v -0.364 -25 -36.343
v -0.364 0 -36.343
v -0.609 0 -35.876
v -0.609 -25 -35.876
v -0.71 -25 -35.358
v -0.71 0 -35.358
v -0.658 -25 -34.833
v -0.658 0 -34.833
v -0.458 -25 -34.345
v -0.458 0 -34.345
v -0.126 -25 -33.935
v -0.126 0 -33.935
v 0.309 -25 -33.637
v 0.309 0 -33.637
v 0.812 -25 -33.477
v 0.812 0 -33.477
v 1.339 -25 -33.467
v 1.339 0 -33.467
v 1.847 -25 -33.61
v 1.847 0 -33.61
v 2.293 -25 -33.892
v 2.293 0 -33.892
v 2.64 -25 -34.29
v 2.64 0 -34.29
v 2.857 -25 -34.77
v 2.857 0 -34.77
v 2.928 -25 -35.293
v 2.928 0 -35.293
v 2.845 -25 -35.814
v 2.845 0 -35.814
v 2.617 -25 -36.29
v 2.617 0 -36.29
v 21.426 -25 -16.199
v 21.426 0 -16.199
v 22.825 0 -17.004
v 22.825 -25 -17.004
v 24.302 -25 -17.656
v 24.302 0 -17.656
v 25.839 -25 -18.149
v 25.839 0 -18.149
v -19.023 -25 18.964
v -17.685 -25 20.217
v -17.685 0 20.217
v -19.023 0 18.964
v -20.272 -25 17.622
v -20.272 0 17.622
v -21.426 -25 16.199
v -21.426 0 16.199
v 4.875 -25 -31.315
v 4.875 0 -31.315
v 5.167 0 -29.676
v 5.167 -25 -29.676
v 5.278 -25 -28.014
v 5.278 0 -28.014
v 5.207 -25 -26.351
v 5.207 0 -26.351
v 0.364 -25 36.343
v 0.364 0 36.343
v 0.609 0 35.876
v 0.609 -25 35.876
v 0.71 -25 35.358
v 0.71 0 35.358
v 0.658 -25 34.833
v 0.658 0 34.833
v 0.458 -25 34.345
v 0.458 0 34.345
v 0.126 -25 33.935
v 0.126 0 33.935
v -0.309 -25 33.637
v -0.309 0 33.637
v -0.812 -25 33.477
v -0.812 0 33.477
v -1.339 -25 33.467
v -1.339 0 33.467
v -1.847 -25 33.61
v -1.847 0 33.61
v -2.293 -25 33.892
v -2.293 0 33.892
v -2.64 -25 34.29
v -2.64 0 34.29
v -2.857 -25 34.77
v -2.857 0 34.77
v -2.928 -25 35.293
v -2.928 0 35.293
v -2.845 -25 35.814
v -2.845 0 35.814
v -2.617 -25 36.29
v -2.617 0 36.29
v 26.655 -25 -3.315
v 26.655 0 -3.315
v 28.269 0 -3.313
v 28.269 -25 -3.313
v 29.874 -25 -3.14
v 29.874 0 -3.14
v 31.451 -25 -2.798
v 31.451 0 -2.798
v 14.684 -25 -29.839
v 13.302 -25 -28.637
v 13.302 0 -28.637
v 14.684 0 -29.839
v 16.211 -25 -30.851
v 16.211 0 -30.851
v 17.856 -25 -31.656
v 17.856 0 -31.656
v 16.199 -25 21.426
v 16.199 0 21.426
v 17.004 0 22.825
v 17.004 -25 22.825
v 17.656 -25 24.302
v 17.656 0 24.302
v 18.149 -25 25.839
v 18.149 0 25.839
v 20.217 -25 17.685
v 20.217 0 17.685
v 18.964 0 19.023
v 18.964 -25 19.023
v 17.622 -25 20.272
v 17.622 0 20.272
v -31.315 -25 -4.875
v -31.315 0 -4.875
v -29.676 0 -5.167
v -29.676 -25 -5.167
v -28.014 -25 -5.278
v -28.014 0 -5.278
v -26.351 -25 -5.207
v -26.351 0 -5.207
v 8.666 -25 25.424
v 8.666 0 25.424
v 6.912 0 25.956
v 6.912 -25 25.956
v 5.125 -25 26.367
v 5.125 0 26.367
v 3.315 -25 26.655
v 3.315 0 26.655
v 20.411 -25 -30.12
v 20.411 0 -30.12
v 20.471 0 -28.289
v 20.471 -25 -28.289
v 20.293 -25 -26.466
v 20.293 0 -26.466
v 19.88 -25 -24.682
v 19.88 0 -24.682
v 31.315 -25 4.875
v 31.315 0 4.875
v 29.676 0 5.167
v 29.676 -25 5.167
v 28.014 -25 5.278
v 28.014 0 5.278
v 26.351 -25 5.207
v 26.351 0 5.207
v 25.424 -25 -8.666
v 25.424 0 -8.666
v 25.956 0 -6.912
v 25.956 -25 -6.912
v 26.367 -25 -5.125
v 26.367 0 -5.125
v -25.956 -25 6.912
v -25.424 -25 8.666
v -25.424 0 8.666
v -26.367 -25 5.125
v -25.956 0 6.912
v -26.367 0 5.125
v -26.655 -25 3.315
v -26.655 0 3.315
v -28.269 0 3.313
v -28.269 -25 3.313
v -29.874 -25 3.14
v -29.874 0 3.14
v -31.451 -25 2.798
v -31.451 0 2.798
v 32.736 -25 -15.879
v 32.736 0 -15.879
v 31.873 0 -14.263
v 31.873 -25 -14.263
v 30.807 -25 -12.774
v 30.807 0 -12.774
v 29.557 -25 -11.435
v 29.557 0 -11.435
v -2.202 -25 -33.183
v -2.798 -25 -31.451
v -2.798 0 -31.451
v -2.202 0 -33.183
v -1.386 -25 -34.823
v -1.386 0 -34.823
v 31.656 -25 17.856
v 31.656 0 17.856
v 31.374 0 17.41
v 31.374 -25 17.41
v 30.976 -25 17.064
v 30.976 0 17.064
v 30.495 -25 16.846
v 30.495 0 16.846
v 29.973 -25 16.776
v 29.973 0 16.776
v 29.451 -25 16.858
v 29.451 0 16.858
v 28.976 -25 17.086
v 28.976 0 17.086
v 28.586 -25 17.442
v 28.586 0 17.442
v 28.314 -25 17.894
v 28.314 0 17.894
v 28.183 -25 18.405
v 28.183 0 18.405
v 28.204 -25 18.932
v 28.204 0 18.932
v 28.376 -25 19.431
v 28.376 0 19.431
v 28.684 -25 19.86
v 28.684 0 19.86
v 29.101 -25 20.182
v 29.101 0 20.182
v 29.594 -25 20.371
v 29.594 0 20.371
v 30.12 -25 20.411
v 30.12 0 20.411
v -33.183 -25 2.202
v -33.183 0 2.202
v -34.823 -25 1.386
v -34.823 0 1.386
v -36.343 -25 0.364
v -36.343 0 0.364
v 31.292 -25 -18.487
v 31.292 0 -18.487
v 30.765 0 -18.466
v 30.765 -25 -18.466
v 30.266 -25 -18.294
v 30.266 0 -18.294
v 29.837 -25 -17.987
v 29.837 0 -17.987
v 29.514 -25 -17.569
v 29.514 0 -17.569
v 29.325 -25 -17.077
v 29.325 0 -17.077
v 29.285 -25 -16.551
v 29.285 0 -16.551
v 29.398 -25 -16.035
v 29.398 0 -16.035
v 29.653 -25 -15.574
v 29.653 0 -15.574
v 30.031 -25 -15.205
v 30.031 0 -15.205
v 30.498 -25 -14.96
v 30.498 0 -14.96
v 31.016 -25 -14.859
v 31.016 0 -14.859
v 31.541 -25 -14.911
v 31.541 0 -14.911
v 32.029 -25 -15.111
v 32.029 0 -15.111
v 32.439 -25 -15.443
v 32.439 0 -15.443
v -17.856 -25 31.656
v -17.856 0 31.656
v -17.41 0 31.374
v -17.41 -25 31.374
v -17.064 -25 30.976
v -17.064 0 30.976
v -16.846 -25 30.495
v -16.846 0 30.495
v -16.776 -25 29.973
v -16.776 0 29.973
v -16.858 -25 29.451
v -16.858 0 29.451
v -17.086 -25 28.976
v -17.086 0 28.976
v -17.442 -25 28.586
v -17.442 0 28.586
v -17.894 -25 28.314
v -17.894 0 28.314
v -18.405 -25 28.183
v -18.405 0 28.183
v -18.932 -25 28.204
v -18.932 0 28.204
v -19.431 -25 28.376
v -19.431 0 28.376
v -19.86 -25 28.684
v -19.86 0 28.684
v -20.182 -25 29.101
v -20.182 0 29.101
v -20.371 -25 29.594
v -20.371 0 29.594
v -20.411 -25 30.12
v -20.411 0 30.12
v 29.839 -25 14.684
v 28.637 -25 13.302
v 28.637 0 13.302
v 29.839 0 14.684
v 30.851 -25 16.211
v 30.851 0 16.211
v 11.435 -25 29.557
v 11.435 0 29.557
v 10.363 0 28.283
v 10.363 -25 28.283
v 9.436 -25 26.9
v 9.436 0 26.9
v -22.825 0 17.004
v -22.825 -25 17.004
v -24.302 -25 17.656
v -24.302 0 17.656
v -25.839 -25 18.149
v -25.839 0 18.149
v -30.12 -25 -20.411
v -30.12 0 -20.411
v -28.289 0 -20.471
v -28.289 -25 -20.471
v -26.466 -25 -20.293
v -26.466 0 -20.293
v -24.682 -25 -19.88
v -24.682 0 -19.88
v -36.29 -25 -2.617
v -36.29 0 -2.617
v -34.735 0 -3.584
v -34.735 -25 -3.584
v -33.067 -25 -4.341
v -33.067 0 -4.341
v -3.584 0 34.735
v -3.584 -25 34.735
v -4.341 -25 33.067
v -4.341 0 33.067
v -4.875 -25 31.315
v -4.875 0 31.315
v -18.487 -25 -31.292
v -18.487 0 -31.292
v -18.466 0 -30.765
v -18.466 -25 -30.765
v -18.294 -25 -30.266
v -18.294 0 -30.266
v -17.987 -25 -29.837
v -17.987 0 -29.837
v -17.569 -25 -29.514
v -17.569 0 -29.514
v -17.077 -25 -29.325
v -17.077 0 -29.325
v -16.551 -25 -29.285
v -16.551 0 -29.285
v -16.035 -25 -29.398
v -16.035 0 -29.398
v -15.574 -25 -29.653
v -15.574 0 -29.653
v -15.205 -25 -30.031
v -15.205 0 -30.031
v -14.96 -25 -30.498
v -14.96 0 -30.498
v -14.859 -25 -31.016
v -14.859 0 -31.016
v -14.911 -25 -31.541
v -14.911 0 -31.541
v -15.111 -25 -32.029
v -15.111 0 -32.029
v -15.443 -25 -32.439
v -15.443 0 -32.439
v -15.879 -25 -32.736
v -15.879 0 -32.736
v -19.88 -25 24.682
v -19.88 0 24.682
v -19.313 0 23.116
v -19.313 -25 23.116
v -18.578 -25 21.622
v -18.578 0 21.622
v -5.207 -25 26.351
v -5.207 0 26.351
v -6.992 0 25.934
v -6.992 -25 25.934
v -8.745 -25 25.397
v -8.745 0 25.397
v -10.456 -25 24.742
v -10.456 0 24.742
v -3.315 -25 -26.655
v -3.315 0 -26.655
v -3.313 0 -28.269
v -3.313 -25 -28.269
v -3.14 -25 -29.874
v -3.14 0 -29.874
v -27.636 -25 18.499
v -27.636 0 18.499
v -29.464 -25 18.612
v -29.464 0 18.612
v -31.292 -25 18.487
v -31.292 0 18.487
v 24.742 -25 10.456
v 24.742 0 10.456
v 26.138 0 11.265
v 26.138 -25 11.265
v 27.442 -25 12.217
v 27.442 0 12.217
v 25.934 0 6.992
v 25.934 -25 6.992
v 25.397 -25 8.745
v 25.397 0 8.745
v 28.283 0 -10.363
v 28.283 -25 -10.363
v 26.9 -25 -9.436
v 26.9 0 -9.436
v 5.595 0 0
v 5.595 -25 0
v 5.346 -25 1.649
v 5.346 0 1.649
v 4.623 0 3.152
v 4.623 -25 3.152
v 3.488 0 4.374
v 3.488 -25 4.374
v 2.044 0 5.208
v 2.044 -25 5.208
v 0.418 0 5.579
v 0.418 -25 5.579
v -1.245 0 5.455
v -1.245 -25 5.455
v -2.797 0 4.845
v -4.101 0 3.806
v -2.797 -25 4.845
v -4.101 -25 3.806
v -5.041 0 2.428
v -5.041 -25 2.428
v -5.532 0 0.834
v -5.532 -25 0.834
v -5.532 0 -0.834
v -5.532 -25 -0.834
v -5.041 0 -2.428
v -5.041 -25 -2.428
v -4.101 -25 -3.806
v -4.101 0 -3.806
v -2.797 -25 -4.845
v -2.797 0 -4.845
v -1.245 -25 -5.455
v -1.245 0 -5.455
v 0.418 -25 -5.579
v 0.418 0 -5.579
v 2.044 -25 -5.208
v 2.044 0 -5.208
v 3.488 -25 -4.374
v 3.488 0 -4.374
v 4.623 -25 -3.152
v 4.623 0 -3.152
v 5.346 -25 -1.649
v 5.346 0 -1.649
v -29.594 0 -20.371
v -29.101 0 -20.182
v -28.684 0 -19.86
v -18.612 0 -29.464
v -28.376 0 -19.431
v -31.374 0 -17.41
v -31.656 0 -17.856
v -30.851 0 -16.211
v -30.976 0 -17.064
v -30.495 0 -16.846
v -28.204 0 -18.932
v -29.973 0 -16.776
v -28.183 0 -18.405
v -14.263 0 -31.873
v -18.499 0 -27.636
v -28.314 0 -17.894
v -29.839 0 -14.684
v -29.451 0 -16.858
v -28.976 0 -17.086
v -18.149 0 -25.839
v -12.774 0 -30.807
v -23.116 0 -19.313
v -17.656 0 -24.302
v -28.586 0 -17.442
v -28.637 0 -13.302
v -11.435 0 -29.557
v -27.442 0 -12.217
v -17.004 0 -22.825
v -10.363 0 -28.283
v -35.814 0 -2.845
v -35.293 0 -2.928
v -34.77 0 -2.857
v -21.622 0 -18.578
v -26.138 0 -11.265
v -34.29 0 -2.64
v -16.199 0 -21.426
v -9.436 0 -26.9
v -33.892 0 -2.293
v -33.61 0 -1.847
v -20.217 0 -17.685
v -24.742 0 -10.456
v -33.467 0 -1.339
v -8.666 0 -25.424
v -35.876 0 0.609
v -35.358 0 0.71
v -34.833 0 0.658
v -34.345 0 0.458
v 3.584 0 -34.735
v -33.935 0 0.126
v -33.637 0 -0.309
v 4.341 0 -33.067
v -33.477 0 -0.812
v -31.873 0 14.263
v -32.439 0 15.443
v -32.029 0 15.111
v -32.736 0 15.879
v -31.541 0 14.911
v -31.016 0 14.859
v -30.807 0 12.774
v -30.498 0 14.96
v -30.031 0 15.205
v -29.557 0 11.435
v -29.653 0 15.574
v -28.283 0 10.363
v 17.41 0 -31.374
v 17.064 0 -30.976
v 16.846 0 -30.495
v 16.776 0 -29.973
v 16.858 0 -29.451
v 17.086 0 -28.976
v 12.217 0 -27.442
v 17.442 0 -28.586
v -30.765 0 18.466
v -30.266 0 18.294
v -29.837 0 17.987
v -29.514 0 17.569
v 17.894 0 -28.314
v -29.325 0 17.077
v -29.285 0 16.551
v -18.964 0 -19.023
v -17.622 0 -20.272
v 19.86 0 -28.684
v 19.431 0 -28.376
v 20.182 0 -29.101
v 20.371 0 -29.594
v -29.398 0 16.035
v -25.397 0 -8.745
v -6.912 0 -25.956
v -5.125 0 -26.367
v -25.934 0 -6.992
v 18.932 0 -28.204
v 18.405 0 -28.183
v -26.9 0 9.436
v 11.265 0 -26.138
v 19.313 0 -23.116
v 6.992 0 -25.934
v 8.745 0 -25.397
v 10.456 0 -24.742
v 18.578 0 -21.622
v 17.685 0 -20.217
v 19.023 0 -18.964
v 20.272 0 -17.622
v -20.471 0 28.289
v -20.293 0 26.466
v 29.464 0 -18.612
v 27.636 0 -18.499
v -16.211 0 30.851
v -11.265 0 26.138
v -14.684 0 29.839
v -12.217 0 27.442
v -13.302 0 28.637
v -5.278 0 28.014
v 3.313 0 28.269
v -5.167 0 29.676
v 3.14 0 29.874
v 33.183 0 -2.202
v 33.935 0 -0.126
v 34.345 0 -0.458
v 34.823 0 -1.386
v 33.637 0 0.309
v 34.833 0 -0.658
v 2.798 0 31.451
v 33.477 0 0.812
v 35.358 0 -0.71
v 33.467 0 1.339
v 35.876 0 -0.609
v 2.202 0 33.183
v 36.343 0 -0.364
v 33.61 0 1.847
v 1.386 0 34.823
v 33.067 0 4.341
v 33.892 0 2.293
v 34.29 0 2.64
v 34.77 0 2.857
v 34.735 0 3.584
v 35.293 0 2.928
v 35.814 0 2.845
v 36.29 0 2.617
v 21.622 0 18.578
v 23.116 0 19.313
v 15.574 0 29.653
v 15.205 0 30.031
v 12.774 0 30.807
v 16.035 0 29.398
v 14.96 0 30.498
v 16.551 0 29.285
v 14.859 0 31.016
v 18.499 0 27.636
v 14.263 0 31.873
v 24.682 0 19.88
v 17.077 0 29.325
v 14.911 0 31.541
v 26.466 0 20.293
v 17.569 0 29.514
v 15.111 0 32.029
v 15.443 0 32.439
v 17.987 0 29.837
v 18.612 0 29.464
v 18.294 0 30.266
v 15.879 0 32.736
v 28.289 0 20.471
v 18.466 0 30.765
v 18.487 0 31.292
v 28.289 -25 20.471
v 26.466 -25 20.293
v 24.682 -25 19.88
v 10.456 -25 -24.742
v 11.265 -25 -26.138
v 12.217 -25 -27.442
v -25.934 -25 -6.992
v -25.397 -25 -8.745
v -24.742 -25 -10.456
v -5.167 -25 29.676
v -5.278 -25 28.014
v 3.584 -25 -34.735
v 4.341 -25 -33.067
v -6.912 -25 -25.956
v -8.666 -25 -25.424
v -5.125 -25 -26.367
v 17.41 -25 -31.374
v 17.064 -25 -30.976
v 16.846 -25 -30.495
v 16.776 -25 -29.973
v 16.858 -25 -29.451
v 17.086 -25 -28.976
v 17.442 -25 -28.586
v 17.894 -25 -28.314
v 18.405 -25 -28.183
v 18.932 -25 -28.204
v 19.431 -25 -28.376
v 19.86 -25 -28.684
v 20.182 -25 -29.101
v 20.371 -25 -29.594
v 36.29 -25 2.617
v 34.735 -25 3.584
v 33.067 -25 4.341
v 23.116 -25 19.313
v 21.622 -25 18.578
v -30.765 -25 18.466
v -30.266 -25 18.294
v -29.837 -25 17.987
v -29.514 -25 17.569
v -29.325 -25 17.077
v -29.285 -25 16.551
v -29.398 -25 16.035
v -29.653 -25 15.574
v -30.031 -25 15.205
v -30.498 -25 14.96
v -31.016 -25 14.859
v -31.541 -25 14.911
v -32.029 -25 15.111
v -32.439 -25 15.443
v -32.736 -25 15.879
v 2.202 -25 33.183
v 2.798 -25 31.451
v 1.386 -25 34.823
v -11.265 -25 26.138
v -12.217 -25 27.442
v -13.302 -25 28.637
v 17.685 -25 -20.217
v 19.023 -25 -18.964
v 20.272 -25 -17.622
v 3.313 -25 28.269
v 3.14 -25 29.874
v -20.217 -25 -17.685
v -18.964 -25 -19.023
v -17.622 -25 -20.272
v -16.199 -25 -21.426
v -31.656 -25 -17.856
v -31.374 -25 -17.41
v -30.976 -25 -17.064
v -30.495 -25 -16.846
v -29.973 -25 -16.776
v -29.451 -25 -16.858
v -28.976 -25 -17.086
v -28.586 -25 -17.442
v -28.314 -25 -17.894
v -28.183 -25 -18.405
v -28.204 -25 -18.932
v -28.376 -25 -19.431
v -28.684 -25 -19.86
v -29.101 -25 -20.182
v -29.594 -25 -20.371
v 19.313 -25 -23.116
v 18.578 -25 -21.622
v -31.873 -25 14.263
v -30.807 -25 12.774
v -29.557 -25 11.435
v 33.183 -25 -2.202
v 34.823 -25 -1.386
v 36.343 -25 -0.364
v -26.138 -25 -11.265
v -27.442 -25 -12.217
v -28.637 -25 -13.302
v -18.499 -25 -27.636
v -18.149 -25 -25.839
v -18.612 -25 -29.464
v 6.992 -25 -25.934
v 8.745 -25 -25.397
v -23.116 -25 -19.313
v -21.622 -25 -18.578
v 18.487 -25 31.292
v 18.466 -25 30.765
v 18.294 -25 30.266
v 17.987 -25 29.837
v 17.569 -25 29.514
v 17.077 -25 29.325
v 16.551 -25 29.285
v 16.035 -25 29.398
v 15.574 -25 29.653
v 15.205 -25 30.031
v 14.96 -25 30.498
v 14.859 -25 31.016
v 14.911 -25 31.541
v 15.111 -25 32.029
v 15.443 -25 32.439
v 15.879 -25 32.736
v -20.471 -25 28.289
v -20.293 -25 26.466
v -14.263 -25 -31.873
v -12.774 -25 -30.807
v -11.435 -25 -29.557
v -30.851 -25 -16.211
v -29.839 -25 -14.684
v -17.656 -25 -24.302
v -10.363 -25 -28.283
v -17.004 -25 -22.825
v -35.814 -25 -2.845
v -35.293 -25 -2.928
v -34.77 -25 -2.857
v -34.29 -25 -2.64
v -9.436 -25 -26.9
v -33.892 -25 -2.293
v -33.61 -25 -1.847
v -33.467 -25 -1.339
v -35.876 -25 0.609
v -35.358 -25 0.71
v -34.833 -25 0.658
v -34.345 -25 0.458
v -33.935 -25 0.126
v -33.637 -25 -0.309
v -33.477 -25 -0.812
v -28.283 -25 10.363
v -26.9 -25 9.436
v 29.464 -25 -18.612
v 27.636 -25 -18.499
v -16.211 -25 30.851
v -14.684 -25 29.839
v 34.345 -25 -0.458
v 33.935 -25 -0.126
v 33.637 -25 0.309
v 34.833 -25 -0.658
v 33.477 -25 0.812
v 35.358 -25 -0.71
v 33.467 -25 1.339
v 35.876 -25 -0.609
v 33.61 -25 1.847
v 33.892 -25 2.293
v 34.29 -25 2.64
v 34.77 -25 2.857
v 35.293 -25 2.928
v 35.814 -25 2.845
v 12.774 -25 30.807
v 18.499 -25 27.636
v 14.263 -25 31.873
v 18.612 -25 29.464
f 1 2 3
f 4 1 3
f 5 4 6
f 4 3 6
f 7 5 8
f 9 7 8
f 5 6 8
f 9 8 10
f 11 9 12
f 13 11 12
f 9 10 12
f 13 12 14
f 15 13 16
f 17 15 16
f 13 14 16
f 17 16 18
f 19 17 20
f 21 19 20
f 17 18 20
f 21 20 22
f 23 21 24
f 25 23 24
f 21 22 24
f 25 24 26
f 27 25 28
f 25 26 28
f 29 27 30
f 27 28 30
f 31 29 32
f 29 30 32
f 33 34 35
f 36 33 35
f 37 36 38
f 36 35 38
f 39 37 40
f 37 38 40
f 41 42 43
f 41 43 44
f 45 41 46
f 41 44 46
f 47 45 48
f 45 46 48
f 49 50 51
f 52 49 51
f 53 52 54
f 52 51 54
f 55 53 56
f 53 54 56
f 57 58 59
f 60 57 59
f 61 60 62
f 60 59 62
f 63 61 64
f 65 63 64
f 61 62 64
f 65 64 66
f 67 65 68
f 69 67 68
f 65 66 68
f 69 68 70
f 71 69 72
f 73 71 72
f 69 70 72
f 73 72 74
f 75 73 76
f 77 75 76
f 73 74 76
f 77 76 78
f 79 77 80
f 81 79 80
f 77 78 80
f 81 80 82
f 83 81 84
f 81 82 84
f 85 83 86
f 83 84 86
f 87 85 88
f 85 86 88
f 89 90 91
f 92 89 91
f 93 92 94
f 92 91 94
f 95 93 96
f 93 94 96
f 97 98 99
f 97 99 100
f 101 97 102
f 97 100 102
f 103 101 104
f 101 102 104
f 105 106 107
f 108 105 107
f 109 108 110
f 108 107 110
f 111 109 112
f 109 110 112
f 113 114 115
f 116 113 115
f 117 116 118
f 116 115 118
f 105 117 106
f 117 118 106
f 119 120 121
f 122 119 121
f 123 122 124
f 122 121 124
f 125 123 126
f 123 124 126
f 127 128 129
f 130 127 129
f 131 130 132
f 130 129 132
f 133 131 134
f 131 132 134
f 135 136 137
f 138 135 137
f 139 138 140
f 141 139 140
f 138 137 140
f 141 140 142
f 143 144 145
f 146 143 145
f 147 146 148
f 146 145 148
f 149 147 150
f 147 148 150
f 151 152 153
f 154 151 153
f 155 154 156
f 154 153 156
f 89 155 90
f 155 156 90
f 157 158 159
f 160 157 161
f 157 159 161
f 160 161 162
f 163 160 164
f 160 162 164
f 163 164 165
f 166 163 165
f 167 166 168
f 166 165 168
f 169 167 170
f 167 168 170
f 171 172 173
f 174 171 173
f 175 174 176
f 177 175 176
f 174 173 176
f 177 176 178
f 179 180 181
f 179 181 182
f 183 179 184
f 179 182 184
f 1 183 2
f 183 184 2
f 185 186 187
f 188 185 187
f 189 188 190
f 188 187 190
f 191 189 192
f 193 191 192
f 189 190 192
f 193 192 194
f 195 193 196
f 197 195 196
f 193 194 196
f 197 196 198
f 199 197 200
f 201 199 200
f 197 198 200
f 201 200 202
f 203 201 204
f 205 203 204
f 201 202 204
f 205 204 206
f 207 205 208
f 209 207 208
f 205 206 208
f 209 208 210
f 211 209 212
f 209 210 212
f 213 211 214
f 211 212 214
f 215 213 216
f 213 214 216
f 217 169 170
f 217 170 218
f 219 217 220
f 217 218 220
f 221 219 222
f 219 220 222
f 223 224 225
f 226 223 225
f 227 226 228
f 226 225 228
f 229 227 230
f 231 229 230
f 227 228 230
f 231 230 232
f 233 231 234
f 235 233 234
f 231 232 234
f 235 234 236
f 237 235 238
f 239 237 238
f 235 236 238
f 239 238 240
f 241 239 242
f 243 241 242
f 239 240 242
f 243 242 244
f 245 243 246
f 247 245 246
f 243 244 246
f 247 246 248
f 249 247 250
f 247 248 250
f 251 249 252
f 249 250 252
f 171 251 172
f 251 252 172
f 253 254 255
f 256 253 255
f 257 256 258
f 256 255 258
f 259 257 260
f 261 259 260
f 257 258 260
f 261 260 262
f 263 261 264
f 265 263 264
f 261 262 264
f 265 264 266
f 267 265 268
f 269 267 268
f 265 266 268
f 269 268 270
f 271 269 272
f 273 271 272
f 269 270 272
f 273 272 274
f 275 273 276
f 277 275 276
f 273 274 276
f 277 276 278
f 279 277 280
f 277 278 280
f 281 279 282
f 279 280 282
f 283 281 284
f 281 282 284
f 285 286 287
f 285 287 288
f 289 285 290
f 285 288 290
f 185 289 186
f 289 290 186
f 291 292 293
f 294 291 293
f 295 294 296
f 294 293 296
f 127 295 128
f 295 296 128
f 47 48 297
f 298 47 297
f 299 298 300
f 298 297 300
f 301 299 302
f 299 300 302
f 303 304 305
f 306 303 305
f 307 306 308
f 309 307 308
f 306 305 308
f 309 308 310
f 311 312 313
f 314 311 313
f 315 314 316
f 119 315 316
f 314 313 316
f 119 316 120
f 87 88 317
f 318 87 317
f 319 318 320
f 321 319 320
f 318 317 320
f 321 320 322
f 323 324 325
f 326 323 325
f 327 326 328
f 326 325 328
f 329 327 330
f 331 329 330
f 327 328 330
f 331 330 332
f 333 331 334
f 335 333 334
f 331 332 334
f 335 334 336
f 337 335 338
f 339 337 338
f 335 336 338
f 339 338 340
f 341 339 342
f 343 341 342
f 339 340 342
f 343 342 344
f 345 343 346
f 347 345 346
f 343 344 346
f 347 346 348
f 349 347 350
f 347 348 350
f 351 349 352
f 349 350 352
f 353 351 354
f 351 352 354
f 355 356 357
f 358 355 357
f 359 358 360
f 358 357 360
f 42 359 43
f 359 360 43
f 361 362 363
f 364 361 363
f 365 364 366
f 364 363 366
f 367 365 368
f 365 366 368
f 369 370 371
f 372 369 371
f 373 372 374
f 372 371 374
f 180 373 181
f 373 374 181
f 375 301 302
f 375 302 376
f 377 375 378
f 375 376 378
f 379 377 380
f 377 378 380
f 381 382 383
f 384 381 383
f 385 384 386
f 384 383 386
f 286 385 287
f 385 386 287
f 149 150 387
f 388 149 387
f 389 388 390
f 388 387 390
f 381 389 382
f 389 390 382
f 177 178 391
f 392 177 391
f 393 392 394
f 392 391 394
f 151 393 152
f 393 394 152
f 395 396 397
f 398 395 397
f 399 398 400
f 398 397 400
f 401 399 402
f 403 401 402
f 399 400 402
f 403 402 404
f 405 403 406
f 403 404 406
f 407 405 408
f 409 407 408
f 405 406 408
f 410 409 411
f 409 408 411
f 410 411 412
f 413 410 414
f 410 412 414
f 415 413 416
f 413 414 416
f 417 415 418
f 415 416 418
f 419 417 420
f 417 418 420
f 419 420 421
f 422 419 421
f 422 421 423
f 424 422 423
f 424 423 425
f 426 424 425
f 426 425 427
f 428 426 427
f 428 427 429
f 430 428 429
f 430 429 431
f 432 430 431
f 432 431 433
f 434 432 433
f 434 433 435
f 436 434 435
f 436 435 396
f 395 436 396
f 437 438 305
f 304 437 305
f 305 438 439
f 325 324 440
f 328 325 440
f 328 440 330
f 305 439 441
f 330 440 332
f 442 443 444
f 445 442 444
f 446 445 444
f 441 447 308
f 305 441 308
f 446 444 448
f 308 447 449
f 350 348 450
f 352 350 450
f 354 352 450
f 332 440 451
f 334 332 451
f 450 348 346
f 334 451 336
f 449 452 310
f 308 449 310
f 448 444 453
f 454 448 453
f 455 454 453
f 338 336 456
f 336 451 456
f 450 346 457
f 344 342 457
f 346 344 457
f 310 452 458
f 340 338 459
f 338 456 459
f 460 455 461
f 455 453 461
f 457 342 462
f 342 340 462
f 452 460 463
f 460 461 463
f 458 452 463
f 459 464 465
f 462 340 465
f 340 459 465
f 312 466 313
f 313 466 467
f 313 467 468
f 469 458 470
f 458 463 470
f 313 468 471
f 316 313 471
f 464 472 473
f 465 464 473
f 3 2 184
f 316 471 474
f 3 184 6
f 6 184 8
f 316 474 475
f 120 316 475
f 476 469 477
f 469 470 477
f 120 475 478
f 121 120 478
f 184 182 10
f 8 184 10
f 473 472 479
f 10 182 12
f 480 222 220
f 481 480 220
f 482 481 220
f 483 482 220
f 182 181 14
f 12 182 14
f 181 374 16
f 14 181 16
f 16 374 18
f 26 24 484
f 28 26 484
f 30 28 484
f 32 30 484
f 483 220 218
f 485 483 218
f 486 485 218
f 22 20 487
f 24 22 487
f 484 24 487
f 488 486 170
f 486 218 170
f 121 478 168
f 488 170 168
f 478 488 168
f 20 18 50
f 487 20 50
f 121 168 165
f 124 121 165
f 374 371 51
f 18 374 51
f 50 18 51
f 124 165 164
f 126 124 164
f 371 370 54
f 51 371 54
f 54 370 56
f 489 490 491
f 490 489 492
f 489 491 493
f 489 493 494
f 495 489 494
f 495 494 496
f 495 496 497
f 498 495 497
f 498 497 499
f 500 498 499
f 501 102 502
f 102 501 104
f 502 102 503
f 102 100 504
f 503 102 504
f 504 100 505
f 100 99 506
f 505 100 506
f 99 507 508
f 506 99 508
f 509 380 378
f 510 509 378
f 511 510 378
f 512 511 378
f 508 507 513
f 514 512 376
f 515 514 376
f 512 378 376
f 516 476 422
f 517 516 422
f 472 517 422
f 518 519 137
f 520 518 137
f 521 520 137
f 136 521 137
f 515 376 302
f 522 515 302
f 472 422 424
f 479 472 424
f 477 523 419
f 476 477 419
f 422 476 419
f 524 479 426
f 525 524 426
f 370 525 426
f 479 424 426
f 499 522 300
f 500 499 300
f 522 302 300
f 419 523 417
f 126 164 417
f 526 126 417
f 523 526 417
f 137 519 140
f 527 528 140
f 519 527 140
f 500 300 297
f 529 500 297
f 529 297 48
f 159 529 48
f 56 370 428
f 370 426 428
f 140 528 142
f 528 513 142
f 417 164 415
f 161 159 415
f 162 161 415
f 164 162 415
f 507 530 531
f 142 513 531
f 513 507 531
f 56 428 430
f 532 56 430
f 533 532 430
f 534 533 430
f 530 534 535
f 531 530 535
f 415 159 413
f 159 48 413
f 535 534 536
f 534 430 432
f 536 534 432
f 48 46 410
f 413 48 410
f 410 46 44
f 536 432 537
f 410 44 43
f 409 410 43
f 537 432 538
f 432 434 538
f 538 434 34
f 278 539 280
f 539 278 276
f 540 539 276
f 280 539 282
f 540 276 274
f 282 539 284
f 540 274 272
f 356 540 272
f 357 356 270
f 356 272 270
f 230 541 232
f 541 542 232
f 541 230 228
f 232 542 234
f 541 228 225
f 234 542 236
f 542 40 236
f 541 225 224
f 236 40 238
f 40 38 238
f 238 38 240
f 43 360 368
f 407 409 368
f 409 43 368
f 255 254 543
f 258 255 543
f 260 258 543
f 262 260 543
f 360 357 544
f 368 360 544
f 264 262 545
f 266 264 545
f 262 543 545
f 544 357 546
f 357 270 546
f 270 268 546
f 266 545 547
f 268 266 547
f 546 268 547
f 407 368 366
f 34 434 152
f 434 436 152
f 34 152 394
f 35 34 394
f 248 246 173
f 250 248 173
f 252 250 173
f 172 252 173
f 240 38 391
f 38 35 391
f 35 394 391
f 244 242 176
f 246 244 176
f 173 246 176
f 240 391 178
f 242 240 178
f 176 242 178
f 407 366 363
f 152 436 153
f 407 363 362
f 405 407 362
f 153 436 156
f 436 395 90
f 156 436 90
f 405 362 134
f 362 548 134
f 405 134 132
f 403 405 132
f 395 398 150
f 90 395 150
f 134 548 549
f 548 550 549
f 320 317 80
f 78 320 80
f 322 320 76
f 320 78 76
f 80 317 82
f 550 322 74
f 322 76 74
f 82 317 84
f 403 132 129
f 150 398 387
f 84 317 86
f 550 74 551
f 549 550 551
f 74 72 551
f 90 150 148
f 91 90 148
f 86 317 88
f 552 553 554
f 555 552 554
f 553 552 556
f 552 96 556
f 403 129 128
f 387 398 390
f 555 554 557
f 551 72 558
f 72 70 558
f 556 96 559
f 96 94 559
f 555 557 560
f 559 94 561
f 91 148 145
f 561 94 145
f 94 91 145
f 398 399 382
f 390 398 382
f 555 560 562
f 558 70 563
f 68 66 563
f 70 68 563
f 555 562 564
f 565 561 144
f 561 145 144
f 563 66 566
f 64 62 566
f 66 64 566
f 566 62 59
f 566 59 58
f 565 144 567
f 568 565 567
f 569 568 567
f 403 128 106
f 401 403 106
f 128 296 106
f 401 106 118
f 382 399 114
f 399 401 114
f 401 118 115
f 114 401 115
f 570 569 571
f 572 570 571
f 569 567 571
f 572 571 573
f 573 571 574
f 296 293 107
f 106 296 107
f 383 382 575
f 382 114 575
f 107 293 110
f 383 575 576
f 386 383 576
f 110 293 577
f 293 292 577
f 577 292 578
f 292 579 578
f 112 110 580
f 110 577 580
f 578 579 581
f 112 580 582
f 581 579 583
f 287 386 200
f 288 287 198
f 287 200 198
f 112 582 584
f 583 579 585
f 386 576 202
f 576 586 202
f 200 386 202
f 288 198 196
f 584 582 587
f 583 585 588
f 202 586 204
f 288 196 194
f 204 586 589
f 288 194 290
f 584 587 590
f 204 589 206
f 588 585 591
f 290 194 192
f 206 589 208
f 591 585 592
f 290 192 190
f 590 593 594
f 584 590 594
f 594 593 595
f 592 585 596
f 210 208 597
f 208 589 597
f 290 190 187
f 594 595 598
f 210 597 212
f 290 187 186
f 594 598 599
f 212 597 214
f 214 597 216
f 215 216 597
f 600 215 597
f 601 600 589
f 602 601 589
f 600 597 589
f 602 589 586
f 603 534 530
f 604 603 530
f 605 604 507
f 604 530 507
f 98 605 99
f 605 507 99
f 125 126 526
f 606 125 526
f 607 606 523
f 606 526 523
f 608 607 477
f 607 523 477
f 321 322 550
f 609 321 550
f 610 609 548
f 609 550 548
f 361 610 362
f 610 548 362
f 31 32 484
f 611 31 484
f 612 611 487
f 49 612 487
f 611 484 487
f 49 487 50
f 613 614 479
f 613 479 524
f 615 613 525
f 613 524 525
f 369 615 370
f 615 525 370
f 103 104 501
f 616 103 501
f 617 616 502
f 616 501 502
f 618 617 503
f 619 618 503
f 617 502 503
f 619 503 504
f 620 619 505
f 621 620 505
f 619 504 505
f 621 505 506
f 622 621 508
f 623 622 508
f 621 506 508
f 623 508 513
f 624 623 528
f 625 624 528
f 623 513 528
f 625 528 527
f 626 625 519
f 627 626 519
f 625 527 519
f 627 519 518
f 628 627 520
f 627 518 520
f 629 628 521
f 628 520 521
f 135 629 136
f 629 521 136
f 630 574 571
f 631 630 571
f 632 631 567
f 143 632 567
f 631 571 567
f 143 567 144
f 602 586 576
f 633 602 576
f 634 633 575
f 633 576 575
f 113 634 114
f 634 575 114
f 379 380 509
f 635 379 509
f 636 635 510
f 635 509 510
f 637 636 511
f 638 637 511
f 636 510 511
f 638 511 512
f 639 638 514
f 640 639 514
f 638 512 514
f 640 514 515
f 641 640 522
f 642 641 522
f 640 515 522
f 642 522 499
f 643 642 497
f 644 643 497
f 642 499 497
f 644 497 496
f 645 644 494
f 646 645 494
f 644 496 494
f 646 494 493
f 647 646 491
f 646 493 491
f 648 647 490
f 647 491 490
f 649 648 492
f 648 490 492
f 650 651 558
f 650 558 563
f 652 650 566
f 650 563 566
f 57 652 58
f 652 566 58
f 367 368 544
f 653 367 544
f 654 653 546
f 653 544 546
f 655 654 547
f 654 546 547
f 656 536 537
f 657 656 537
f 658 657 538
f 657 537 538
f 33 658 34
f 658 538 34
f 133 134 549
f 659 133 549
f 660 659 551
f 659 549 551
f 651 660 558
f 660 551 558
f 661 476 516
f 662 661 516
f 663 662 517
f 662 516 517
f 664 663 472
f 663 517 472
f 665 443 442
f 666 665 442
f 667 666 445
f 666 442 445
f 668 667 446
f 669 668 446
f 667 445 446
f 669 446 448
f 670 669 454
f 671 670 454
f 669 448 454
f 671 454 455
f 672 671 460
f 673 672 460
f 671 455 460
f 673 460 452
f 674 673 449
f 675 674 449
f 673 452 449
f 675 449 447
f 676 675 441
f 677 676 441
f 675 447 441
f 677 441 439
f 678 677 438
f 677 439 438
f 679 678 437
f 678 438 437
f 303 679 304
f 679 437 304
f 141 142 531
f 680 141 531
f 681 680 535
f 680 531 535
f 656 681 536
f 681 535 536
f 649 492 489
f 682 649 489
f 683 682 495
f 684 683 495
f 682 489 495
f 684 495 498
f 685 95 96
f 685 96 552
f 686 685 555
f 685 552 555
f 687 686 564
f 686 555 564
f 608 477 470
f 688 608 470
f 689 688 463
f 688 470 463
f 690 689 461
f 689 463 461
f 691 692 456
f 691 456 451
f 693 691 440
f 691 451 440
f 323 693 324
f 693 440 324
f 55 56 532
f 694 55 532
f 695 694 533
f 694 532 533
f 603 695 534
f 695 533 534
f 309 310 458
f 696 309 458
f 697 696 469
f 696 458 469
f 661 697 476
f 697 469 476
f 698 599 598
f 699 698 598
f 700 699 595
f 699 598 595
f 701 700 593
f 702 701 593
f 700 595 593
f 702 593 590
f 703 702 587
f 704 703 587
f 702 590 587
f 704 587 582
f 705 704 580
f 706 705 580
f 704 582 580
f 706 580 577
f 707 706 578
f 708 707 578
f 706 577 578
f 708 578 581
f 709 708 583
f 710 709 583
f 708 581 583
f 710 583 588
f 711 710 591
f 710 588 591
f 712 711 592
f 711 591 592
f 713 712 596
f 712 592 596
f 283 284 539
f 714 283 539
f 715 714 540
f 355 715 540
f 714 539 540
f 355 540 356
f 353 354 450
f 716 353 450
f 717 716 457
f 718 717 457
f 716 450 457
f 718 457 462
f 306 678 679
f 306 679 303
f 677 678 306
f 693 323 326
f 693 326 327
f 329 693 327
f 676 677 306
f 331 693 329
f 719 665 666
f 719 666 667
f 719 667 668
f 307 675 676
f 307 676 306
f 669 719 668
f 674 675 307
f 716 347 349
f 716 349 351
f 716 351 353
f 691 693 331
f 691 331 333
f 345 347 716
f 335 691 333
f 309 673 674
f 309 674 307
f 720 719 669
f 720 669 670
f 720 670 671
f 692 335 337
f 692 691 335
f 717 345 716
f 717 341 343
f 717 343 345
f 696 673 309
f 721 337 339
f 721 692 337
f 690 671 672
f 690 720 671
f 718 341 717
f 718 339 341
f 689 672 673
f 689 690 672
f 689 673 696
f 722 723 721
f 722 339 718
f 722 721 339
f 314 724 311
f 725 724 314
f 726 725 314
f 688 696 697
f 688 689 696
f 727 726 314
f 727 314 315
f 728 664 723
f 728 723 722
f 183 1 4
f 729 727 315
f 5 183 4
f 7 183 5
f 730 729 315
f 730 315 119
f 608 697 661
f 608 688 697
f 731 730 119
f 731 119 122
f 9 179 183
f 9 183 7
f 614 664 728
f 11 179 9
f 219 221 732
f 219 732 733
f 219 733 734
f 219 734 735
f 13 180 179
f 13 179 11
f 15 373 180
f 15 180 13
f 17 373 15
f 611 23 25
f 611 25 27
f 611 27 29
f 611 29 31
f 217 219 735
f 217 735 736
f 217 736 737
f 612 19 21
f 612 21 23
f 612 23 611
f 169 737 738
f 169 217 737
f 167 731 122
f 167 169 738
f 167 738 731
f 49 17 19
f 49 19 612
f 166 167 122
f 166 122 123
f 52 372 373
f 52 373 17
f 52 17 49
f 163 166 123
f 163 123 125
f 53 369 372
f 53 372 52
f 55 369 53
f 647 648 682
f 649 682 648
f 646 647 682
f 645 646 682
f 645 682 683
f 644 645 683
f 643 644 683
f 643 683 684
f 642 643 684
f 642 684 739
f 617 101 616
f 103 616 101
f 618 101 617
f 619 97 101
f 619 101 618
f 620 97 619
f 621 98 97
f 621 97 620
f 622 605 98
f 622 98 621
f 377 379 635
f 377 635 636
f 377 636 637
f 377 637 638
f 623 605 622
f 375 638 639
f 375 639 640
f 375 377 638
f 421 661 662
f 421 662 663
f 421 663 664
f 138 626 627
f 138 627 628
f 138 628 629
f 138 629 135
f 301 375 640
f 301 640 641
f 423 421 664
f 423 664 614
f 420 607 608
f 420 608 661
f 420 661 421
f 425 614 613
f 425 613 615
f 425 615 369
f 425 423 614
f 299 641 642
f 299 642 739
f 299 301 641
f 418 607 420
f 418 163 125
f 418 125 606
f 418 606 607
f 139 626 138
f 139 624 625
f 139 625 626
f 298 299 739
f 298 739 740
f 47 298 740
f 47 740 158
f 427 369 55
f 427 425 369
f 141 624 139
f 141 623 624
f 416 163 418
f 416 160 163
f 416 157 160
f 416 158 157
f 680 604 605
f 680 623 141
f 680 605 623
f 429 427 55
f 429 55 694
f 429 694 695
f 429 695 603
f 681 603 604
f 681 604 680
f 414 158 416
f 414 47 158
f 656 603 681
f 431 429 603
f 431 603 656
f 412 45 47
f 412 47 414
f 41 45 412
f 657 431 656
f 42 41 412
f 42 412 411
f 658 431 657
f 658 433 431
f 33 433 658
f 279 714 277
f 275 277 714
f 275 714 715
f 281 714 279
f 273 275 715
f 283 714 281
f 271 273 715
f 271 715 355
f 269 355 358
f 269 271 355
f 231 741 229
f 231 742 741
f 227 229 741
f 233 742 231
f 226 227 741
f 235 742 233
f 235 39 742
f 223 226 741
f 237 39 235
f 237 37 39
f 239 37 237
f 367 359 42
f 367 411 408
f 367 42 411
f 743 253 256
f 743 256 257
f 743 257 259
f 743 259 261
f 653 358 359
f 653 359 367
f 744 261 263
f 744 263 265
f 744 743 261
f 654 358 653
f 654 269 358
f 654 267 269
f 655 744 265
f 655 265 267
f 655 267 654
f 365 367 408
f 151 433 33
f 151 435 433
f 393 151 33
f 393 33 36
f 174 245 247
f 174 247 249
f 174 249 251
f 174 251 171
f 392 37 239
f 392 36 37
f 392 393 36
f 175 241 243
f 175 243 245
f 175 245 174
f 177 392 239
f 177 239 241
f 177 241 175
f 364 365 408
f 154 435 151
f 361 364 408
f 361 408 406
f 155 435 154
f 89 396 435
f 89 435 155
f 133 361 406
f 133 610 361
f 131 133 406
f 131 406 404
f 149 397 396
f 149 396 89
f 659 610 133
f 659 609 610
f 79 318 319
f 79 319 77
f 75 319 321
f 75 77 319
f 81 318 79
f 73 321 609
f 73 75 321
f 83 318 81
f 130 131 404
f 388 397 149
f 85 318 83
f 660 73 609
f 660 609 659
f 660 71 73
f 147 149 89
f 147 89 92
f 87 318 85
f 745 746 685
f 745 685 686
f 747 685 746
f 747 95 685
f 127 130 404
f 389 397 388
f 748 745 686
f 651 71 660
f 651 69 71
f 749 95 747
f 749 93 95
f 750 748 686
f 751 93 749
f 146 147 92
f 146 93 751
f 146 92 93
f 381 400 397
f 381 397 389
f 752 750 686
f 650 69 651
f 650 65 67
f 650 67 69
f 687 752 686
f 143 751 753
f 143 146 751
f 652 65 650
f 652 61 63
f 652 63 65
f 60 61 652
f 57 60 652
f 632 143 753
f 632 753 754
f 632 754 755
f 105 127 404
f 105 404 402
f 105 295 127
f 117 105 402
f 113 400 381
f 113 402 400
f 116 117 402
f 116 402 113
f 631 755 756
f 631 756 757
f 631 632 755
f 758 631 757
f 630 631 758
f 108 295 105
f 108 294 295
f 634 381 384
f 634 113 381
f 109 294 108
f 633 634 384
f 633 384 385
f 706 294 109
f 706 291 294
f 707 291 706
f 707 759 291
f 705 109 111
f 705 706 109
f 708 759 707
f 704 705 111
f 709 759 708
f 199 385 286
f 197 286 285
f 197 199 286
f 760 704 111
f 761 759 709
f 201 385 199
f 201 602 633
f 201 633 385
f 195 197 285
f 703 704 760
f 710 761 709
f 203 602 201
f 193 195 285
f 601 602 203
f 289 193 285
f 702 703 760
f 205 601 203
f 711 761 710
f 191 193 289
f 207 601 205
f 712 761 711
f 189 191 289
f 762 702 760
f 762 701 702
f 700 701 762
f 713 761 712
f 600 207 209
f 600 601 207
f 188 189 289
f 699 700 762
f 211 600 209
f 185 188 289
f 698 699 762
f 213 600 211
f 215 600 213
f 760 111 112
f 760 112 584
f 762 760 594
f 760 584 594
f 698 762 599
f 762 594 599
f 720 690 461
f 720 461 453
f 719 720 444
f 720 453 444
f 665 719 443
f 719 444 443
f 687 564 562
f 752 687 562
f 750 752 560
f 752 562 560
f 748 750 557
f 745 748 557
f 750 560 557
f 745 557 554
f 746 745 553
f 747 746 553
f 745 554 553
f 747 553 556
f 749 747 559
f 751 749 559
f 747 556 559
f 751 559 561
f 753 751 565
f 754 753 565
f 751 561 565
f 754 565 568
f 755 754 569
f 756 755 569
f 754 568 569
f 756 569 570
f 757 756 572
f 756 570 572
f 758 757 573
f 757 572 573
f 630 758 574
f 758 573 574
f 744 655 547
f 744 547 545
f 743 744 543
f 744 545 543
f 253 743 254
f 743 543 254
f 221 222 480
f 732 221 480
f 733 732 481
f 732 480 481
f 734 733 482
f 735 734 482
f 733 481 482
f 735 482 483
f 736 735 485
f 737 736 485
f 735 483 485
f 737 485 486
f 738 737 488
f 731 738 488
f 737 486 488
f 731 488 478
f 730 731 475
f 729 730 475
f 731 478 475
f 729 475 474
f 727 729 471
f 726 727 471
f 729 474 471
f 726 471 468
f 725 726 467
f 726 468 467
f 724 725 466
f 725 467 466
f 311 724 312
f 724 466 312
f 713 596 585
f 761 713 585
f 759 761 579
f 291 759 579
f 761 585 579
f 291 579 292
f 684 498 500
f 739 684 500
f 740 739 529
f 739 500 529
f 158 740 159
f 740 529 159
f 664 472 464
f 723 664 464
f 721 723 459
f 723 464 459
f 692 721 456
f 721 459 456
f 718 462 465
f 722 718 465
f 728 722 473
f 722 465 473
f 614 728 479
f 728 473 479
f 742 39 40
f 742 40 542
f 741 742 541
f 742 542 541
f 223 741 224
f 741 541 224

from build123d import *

# Parameters (mm, degrees)
F1_DEPTH = 25
F2_COUNT = 12
F3_R     = 5.594929
F4_DEPTH = 45.5


with BuildPart() as f1:
    # F0 (on Front) → F1 (new body)
    with BuildSketch(Plane.XZ):
        with BuildLine():
            ThreePointArc((-5.207343, 26.350902), (-17.053073, -20.752811), (26.8605, 0))
            ThreePointArc((26.8605, 0), (20.131278, 17.782523), (3.315285, 26.655119))
            ThreePointArc((3.315285, 26.655119), (-0.958179, 26.843404), (-5.207343, 26.350902))
        make_face()
        with BuildLine():
            ThreePointArc((-5.207343, 26.350902), (-0.958179, 26.843404), (3.315285, 26.655119))
            ThreePointArc((3.315285, 26.655119), (3.247938, 29.073857), (2.798331, 31.451394))
            ThreePointArc((2.798331, 31.451394), (1.82091, 34.016407), (0.364343, 36.343005))
            ThreePointArc((0.364343, 36.343005), (-1.075338, 33.452857), (-2.616887, 36.289979))
            ThreePointArc((-2.616887, 36.289979), (-3.989795, 33.913056), (-4.875382, 31.314906))
            ThreePointArc((-4.875382, 31.314906), (-5.245453, 28.846552), (-5.207343, 26.350902))
        make_face()
    extrude(amount=F1_DEPTH)

    # F2: F1 ×12 about axis
    f2_axis = Axis((0, 0, 0), (0, 1, 0))


with BuildPart() as f1_1:
    add(f1.part)
    for i in range(1, F2_COUNT):
        add(f1.part.rotate(f2_axis, i * 360 / F2_COUNT))

    # F3 (on face) → F4 (cut)
    with BuildSketch(Plane.XZ.offset(25)):
        Circle(F3_R)
    extrude(amount=-F4_DEPTH, mode=Mode.SUBTRACT)


solid = f1_1.part
